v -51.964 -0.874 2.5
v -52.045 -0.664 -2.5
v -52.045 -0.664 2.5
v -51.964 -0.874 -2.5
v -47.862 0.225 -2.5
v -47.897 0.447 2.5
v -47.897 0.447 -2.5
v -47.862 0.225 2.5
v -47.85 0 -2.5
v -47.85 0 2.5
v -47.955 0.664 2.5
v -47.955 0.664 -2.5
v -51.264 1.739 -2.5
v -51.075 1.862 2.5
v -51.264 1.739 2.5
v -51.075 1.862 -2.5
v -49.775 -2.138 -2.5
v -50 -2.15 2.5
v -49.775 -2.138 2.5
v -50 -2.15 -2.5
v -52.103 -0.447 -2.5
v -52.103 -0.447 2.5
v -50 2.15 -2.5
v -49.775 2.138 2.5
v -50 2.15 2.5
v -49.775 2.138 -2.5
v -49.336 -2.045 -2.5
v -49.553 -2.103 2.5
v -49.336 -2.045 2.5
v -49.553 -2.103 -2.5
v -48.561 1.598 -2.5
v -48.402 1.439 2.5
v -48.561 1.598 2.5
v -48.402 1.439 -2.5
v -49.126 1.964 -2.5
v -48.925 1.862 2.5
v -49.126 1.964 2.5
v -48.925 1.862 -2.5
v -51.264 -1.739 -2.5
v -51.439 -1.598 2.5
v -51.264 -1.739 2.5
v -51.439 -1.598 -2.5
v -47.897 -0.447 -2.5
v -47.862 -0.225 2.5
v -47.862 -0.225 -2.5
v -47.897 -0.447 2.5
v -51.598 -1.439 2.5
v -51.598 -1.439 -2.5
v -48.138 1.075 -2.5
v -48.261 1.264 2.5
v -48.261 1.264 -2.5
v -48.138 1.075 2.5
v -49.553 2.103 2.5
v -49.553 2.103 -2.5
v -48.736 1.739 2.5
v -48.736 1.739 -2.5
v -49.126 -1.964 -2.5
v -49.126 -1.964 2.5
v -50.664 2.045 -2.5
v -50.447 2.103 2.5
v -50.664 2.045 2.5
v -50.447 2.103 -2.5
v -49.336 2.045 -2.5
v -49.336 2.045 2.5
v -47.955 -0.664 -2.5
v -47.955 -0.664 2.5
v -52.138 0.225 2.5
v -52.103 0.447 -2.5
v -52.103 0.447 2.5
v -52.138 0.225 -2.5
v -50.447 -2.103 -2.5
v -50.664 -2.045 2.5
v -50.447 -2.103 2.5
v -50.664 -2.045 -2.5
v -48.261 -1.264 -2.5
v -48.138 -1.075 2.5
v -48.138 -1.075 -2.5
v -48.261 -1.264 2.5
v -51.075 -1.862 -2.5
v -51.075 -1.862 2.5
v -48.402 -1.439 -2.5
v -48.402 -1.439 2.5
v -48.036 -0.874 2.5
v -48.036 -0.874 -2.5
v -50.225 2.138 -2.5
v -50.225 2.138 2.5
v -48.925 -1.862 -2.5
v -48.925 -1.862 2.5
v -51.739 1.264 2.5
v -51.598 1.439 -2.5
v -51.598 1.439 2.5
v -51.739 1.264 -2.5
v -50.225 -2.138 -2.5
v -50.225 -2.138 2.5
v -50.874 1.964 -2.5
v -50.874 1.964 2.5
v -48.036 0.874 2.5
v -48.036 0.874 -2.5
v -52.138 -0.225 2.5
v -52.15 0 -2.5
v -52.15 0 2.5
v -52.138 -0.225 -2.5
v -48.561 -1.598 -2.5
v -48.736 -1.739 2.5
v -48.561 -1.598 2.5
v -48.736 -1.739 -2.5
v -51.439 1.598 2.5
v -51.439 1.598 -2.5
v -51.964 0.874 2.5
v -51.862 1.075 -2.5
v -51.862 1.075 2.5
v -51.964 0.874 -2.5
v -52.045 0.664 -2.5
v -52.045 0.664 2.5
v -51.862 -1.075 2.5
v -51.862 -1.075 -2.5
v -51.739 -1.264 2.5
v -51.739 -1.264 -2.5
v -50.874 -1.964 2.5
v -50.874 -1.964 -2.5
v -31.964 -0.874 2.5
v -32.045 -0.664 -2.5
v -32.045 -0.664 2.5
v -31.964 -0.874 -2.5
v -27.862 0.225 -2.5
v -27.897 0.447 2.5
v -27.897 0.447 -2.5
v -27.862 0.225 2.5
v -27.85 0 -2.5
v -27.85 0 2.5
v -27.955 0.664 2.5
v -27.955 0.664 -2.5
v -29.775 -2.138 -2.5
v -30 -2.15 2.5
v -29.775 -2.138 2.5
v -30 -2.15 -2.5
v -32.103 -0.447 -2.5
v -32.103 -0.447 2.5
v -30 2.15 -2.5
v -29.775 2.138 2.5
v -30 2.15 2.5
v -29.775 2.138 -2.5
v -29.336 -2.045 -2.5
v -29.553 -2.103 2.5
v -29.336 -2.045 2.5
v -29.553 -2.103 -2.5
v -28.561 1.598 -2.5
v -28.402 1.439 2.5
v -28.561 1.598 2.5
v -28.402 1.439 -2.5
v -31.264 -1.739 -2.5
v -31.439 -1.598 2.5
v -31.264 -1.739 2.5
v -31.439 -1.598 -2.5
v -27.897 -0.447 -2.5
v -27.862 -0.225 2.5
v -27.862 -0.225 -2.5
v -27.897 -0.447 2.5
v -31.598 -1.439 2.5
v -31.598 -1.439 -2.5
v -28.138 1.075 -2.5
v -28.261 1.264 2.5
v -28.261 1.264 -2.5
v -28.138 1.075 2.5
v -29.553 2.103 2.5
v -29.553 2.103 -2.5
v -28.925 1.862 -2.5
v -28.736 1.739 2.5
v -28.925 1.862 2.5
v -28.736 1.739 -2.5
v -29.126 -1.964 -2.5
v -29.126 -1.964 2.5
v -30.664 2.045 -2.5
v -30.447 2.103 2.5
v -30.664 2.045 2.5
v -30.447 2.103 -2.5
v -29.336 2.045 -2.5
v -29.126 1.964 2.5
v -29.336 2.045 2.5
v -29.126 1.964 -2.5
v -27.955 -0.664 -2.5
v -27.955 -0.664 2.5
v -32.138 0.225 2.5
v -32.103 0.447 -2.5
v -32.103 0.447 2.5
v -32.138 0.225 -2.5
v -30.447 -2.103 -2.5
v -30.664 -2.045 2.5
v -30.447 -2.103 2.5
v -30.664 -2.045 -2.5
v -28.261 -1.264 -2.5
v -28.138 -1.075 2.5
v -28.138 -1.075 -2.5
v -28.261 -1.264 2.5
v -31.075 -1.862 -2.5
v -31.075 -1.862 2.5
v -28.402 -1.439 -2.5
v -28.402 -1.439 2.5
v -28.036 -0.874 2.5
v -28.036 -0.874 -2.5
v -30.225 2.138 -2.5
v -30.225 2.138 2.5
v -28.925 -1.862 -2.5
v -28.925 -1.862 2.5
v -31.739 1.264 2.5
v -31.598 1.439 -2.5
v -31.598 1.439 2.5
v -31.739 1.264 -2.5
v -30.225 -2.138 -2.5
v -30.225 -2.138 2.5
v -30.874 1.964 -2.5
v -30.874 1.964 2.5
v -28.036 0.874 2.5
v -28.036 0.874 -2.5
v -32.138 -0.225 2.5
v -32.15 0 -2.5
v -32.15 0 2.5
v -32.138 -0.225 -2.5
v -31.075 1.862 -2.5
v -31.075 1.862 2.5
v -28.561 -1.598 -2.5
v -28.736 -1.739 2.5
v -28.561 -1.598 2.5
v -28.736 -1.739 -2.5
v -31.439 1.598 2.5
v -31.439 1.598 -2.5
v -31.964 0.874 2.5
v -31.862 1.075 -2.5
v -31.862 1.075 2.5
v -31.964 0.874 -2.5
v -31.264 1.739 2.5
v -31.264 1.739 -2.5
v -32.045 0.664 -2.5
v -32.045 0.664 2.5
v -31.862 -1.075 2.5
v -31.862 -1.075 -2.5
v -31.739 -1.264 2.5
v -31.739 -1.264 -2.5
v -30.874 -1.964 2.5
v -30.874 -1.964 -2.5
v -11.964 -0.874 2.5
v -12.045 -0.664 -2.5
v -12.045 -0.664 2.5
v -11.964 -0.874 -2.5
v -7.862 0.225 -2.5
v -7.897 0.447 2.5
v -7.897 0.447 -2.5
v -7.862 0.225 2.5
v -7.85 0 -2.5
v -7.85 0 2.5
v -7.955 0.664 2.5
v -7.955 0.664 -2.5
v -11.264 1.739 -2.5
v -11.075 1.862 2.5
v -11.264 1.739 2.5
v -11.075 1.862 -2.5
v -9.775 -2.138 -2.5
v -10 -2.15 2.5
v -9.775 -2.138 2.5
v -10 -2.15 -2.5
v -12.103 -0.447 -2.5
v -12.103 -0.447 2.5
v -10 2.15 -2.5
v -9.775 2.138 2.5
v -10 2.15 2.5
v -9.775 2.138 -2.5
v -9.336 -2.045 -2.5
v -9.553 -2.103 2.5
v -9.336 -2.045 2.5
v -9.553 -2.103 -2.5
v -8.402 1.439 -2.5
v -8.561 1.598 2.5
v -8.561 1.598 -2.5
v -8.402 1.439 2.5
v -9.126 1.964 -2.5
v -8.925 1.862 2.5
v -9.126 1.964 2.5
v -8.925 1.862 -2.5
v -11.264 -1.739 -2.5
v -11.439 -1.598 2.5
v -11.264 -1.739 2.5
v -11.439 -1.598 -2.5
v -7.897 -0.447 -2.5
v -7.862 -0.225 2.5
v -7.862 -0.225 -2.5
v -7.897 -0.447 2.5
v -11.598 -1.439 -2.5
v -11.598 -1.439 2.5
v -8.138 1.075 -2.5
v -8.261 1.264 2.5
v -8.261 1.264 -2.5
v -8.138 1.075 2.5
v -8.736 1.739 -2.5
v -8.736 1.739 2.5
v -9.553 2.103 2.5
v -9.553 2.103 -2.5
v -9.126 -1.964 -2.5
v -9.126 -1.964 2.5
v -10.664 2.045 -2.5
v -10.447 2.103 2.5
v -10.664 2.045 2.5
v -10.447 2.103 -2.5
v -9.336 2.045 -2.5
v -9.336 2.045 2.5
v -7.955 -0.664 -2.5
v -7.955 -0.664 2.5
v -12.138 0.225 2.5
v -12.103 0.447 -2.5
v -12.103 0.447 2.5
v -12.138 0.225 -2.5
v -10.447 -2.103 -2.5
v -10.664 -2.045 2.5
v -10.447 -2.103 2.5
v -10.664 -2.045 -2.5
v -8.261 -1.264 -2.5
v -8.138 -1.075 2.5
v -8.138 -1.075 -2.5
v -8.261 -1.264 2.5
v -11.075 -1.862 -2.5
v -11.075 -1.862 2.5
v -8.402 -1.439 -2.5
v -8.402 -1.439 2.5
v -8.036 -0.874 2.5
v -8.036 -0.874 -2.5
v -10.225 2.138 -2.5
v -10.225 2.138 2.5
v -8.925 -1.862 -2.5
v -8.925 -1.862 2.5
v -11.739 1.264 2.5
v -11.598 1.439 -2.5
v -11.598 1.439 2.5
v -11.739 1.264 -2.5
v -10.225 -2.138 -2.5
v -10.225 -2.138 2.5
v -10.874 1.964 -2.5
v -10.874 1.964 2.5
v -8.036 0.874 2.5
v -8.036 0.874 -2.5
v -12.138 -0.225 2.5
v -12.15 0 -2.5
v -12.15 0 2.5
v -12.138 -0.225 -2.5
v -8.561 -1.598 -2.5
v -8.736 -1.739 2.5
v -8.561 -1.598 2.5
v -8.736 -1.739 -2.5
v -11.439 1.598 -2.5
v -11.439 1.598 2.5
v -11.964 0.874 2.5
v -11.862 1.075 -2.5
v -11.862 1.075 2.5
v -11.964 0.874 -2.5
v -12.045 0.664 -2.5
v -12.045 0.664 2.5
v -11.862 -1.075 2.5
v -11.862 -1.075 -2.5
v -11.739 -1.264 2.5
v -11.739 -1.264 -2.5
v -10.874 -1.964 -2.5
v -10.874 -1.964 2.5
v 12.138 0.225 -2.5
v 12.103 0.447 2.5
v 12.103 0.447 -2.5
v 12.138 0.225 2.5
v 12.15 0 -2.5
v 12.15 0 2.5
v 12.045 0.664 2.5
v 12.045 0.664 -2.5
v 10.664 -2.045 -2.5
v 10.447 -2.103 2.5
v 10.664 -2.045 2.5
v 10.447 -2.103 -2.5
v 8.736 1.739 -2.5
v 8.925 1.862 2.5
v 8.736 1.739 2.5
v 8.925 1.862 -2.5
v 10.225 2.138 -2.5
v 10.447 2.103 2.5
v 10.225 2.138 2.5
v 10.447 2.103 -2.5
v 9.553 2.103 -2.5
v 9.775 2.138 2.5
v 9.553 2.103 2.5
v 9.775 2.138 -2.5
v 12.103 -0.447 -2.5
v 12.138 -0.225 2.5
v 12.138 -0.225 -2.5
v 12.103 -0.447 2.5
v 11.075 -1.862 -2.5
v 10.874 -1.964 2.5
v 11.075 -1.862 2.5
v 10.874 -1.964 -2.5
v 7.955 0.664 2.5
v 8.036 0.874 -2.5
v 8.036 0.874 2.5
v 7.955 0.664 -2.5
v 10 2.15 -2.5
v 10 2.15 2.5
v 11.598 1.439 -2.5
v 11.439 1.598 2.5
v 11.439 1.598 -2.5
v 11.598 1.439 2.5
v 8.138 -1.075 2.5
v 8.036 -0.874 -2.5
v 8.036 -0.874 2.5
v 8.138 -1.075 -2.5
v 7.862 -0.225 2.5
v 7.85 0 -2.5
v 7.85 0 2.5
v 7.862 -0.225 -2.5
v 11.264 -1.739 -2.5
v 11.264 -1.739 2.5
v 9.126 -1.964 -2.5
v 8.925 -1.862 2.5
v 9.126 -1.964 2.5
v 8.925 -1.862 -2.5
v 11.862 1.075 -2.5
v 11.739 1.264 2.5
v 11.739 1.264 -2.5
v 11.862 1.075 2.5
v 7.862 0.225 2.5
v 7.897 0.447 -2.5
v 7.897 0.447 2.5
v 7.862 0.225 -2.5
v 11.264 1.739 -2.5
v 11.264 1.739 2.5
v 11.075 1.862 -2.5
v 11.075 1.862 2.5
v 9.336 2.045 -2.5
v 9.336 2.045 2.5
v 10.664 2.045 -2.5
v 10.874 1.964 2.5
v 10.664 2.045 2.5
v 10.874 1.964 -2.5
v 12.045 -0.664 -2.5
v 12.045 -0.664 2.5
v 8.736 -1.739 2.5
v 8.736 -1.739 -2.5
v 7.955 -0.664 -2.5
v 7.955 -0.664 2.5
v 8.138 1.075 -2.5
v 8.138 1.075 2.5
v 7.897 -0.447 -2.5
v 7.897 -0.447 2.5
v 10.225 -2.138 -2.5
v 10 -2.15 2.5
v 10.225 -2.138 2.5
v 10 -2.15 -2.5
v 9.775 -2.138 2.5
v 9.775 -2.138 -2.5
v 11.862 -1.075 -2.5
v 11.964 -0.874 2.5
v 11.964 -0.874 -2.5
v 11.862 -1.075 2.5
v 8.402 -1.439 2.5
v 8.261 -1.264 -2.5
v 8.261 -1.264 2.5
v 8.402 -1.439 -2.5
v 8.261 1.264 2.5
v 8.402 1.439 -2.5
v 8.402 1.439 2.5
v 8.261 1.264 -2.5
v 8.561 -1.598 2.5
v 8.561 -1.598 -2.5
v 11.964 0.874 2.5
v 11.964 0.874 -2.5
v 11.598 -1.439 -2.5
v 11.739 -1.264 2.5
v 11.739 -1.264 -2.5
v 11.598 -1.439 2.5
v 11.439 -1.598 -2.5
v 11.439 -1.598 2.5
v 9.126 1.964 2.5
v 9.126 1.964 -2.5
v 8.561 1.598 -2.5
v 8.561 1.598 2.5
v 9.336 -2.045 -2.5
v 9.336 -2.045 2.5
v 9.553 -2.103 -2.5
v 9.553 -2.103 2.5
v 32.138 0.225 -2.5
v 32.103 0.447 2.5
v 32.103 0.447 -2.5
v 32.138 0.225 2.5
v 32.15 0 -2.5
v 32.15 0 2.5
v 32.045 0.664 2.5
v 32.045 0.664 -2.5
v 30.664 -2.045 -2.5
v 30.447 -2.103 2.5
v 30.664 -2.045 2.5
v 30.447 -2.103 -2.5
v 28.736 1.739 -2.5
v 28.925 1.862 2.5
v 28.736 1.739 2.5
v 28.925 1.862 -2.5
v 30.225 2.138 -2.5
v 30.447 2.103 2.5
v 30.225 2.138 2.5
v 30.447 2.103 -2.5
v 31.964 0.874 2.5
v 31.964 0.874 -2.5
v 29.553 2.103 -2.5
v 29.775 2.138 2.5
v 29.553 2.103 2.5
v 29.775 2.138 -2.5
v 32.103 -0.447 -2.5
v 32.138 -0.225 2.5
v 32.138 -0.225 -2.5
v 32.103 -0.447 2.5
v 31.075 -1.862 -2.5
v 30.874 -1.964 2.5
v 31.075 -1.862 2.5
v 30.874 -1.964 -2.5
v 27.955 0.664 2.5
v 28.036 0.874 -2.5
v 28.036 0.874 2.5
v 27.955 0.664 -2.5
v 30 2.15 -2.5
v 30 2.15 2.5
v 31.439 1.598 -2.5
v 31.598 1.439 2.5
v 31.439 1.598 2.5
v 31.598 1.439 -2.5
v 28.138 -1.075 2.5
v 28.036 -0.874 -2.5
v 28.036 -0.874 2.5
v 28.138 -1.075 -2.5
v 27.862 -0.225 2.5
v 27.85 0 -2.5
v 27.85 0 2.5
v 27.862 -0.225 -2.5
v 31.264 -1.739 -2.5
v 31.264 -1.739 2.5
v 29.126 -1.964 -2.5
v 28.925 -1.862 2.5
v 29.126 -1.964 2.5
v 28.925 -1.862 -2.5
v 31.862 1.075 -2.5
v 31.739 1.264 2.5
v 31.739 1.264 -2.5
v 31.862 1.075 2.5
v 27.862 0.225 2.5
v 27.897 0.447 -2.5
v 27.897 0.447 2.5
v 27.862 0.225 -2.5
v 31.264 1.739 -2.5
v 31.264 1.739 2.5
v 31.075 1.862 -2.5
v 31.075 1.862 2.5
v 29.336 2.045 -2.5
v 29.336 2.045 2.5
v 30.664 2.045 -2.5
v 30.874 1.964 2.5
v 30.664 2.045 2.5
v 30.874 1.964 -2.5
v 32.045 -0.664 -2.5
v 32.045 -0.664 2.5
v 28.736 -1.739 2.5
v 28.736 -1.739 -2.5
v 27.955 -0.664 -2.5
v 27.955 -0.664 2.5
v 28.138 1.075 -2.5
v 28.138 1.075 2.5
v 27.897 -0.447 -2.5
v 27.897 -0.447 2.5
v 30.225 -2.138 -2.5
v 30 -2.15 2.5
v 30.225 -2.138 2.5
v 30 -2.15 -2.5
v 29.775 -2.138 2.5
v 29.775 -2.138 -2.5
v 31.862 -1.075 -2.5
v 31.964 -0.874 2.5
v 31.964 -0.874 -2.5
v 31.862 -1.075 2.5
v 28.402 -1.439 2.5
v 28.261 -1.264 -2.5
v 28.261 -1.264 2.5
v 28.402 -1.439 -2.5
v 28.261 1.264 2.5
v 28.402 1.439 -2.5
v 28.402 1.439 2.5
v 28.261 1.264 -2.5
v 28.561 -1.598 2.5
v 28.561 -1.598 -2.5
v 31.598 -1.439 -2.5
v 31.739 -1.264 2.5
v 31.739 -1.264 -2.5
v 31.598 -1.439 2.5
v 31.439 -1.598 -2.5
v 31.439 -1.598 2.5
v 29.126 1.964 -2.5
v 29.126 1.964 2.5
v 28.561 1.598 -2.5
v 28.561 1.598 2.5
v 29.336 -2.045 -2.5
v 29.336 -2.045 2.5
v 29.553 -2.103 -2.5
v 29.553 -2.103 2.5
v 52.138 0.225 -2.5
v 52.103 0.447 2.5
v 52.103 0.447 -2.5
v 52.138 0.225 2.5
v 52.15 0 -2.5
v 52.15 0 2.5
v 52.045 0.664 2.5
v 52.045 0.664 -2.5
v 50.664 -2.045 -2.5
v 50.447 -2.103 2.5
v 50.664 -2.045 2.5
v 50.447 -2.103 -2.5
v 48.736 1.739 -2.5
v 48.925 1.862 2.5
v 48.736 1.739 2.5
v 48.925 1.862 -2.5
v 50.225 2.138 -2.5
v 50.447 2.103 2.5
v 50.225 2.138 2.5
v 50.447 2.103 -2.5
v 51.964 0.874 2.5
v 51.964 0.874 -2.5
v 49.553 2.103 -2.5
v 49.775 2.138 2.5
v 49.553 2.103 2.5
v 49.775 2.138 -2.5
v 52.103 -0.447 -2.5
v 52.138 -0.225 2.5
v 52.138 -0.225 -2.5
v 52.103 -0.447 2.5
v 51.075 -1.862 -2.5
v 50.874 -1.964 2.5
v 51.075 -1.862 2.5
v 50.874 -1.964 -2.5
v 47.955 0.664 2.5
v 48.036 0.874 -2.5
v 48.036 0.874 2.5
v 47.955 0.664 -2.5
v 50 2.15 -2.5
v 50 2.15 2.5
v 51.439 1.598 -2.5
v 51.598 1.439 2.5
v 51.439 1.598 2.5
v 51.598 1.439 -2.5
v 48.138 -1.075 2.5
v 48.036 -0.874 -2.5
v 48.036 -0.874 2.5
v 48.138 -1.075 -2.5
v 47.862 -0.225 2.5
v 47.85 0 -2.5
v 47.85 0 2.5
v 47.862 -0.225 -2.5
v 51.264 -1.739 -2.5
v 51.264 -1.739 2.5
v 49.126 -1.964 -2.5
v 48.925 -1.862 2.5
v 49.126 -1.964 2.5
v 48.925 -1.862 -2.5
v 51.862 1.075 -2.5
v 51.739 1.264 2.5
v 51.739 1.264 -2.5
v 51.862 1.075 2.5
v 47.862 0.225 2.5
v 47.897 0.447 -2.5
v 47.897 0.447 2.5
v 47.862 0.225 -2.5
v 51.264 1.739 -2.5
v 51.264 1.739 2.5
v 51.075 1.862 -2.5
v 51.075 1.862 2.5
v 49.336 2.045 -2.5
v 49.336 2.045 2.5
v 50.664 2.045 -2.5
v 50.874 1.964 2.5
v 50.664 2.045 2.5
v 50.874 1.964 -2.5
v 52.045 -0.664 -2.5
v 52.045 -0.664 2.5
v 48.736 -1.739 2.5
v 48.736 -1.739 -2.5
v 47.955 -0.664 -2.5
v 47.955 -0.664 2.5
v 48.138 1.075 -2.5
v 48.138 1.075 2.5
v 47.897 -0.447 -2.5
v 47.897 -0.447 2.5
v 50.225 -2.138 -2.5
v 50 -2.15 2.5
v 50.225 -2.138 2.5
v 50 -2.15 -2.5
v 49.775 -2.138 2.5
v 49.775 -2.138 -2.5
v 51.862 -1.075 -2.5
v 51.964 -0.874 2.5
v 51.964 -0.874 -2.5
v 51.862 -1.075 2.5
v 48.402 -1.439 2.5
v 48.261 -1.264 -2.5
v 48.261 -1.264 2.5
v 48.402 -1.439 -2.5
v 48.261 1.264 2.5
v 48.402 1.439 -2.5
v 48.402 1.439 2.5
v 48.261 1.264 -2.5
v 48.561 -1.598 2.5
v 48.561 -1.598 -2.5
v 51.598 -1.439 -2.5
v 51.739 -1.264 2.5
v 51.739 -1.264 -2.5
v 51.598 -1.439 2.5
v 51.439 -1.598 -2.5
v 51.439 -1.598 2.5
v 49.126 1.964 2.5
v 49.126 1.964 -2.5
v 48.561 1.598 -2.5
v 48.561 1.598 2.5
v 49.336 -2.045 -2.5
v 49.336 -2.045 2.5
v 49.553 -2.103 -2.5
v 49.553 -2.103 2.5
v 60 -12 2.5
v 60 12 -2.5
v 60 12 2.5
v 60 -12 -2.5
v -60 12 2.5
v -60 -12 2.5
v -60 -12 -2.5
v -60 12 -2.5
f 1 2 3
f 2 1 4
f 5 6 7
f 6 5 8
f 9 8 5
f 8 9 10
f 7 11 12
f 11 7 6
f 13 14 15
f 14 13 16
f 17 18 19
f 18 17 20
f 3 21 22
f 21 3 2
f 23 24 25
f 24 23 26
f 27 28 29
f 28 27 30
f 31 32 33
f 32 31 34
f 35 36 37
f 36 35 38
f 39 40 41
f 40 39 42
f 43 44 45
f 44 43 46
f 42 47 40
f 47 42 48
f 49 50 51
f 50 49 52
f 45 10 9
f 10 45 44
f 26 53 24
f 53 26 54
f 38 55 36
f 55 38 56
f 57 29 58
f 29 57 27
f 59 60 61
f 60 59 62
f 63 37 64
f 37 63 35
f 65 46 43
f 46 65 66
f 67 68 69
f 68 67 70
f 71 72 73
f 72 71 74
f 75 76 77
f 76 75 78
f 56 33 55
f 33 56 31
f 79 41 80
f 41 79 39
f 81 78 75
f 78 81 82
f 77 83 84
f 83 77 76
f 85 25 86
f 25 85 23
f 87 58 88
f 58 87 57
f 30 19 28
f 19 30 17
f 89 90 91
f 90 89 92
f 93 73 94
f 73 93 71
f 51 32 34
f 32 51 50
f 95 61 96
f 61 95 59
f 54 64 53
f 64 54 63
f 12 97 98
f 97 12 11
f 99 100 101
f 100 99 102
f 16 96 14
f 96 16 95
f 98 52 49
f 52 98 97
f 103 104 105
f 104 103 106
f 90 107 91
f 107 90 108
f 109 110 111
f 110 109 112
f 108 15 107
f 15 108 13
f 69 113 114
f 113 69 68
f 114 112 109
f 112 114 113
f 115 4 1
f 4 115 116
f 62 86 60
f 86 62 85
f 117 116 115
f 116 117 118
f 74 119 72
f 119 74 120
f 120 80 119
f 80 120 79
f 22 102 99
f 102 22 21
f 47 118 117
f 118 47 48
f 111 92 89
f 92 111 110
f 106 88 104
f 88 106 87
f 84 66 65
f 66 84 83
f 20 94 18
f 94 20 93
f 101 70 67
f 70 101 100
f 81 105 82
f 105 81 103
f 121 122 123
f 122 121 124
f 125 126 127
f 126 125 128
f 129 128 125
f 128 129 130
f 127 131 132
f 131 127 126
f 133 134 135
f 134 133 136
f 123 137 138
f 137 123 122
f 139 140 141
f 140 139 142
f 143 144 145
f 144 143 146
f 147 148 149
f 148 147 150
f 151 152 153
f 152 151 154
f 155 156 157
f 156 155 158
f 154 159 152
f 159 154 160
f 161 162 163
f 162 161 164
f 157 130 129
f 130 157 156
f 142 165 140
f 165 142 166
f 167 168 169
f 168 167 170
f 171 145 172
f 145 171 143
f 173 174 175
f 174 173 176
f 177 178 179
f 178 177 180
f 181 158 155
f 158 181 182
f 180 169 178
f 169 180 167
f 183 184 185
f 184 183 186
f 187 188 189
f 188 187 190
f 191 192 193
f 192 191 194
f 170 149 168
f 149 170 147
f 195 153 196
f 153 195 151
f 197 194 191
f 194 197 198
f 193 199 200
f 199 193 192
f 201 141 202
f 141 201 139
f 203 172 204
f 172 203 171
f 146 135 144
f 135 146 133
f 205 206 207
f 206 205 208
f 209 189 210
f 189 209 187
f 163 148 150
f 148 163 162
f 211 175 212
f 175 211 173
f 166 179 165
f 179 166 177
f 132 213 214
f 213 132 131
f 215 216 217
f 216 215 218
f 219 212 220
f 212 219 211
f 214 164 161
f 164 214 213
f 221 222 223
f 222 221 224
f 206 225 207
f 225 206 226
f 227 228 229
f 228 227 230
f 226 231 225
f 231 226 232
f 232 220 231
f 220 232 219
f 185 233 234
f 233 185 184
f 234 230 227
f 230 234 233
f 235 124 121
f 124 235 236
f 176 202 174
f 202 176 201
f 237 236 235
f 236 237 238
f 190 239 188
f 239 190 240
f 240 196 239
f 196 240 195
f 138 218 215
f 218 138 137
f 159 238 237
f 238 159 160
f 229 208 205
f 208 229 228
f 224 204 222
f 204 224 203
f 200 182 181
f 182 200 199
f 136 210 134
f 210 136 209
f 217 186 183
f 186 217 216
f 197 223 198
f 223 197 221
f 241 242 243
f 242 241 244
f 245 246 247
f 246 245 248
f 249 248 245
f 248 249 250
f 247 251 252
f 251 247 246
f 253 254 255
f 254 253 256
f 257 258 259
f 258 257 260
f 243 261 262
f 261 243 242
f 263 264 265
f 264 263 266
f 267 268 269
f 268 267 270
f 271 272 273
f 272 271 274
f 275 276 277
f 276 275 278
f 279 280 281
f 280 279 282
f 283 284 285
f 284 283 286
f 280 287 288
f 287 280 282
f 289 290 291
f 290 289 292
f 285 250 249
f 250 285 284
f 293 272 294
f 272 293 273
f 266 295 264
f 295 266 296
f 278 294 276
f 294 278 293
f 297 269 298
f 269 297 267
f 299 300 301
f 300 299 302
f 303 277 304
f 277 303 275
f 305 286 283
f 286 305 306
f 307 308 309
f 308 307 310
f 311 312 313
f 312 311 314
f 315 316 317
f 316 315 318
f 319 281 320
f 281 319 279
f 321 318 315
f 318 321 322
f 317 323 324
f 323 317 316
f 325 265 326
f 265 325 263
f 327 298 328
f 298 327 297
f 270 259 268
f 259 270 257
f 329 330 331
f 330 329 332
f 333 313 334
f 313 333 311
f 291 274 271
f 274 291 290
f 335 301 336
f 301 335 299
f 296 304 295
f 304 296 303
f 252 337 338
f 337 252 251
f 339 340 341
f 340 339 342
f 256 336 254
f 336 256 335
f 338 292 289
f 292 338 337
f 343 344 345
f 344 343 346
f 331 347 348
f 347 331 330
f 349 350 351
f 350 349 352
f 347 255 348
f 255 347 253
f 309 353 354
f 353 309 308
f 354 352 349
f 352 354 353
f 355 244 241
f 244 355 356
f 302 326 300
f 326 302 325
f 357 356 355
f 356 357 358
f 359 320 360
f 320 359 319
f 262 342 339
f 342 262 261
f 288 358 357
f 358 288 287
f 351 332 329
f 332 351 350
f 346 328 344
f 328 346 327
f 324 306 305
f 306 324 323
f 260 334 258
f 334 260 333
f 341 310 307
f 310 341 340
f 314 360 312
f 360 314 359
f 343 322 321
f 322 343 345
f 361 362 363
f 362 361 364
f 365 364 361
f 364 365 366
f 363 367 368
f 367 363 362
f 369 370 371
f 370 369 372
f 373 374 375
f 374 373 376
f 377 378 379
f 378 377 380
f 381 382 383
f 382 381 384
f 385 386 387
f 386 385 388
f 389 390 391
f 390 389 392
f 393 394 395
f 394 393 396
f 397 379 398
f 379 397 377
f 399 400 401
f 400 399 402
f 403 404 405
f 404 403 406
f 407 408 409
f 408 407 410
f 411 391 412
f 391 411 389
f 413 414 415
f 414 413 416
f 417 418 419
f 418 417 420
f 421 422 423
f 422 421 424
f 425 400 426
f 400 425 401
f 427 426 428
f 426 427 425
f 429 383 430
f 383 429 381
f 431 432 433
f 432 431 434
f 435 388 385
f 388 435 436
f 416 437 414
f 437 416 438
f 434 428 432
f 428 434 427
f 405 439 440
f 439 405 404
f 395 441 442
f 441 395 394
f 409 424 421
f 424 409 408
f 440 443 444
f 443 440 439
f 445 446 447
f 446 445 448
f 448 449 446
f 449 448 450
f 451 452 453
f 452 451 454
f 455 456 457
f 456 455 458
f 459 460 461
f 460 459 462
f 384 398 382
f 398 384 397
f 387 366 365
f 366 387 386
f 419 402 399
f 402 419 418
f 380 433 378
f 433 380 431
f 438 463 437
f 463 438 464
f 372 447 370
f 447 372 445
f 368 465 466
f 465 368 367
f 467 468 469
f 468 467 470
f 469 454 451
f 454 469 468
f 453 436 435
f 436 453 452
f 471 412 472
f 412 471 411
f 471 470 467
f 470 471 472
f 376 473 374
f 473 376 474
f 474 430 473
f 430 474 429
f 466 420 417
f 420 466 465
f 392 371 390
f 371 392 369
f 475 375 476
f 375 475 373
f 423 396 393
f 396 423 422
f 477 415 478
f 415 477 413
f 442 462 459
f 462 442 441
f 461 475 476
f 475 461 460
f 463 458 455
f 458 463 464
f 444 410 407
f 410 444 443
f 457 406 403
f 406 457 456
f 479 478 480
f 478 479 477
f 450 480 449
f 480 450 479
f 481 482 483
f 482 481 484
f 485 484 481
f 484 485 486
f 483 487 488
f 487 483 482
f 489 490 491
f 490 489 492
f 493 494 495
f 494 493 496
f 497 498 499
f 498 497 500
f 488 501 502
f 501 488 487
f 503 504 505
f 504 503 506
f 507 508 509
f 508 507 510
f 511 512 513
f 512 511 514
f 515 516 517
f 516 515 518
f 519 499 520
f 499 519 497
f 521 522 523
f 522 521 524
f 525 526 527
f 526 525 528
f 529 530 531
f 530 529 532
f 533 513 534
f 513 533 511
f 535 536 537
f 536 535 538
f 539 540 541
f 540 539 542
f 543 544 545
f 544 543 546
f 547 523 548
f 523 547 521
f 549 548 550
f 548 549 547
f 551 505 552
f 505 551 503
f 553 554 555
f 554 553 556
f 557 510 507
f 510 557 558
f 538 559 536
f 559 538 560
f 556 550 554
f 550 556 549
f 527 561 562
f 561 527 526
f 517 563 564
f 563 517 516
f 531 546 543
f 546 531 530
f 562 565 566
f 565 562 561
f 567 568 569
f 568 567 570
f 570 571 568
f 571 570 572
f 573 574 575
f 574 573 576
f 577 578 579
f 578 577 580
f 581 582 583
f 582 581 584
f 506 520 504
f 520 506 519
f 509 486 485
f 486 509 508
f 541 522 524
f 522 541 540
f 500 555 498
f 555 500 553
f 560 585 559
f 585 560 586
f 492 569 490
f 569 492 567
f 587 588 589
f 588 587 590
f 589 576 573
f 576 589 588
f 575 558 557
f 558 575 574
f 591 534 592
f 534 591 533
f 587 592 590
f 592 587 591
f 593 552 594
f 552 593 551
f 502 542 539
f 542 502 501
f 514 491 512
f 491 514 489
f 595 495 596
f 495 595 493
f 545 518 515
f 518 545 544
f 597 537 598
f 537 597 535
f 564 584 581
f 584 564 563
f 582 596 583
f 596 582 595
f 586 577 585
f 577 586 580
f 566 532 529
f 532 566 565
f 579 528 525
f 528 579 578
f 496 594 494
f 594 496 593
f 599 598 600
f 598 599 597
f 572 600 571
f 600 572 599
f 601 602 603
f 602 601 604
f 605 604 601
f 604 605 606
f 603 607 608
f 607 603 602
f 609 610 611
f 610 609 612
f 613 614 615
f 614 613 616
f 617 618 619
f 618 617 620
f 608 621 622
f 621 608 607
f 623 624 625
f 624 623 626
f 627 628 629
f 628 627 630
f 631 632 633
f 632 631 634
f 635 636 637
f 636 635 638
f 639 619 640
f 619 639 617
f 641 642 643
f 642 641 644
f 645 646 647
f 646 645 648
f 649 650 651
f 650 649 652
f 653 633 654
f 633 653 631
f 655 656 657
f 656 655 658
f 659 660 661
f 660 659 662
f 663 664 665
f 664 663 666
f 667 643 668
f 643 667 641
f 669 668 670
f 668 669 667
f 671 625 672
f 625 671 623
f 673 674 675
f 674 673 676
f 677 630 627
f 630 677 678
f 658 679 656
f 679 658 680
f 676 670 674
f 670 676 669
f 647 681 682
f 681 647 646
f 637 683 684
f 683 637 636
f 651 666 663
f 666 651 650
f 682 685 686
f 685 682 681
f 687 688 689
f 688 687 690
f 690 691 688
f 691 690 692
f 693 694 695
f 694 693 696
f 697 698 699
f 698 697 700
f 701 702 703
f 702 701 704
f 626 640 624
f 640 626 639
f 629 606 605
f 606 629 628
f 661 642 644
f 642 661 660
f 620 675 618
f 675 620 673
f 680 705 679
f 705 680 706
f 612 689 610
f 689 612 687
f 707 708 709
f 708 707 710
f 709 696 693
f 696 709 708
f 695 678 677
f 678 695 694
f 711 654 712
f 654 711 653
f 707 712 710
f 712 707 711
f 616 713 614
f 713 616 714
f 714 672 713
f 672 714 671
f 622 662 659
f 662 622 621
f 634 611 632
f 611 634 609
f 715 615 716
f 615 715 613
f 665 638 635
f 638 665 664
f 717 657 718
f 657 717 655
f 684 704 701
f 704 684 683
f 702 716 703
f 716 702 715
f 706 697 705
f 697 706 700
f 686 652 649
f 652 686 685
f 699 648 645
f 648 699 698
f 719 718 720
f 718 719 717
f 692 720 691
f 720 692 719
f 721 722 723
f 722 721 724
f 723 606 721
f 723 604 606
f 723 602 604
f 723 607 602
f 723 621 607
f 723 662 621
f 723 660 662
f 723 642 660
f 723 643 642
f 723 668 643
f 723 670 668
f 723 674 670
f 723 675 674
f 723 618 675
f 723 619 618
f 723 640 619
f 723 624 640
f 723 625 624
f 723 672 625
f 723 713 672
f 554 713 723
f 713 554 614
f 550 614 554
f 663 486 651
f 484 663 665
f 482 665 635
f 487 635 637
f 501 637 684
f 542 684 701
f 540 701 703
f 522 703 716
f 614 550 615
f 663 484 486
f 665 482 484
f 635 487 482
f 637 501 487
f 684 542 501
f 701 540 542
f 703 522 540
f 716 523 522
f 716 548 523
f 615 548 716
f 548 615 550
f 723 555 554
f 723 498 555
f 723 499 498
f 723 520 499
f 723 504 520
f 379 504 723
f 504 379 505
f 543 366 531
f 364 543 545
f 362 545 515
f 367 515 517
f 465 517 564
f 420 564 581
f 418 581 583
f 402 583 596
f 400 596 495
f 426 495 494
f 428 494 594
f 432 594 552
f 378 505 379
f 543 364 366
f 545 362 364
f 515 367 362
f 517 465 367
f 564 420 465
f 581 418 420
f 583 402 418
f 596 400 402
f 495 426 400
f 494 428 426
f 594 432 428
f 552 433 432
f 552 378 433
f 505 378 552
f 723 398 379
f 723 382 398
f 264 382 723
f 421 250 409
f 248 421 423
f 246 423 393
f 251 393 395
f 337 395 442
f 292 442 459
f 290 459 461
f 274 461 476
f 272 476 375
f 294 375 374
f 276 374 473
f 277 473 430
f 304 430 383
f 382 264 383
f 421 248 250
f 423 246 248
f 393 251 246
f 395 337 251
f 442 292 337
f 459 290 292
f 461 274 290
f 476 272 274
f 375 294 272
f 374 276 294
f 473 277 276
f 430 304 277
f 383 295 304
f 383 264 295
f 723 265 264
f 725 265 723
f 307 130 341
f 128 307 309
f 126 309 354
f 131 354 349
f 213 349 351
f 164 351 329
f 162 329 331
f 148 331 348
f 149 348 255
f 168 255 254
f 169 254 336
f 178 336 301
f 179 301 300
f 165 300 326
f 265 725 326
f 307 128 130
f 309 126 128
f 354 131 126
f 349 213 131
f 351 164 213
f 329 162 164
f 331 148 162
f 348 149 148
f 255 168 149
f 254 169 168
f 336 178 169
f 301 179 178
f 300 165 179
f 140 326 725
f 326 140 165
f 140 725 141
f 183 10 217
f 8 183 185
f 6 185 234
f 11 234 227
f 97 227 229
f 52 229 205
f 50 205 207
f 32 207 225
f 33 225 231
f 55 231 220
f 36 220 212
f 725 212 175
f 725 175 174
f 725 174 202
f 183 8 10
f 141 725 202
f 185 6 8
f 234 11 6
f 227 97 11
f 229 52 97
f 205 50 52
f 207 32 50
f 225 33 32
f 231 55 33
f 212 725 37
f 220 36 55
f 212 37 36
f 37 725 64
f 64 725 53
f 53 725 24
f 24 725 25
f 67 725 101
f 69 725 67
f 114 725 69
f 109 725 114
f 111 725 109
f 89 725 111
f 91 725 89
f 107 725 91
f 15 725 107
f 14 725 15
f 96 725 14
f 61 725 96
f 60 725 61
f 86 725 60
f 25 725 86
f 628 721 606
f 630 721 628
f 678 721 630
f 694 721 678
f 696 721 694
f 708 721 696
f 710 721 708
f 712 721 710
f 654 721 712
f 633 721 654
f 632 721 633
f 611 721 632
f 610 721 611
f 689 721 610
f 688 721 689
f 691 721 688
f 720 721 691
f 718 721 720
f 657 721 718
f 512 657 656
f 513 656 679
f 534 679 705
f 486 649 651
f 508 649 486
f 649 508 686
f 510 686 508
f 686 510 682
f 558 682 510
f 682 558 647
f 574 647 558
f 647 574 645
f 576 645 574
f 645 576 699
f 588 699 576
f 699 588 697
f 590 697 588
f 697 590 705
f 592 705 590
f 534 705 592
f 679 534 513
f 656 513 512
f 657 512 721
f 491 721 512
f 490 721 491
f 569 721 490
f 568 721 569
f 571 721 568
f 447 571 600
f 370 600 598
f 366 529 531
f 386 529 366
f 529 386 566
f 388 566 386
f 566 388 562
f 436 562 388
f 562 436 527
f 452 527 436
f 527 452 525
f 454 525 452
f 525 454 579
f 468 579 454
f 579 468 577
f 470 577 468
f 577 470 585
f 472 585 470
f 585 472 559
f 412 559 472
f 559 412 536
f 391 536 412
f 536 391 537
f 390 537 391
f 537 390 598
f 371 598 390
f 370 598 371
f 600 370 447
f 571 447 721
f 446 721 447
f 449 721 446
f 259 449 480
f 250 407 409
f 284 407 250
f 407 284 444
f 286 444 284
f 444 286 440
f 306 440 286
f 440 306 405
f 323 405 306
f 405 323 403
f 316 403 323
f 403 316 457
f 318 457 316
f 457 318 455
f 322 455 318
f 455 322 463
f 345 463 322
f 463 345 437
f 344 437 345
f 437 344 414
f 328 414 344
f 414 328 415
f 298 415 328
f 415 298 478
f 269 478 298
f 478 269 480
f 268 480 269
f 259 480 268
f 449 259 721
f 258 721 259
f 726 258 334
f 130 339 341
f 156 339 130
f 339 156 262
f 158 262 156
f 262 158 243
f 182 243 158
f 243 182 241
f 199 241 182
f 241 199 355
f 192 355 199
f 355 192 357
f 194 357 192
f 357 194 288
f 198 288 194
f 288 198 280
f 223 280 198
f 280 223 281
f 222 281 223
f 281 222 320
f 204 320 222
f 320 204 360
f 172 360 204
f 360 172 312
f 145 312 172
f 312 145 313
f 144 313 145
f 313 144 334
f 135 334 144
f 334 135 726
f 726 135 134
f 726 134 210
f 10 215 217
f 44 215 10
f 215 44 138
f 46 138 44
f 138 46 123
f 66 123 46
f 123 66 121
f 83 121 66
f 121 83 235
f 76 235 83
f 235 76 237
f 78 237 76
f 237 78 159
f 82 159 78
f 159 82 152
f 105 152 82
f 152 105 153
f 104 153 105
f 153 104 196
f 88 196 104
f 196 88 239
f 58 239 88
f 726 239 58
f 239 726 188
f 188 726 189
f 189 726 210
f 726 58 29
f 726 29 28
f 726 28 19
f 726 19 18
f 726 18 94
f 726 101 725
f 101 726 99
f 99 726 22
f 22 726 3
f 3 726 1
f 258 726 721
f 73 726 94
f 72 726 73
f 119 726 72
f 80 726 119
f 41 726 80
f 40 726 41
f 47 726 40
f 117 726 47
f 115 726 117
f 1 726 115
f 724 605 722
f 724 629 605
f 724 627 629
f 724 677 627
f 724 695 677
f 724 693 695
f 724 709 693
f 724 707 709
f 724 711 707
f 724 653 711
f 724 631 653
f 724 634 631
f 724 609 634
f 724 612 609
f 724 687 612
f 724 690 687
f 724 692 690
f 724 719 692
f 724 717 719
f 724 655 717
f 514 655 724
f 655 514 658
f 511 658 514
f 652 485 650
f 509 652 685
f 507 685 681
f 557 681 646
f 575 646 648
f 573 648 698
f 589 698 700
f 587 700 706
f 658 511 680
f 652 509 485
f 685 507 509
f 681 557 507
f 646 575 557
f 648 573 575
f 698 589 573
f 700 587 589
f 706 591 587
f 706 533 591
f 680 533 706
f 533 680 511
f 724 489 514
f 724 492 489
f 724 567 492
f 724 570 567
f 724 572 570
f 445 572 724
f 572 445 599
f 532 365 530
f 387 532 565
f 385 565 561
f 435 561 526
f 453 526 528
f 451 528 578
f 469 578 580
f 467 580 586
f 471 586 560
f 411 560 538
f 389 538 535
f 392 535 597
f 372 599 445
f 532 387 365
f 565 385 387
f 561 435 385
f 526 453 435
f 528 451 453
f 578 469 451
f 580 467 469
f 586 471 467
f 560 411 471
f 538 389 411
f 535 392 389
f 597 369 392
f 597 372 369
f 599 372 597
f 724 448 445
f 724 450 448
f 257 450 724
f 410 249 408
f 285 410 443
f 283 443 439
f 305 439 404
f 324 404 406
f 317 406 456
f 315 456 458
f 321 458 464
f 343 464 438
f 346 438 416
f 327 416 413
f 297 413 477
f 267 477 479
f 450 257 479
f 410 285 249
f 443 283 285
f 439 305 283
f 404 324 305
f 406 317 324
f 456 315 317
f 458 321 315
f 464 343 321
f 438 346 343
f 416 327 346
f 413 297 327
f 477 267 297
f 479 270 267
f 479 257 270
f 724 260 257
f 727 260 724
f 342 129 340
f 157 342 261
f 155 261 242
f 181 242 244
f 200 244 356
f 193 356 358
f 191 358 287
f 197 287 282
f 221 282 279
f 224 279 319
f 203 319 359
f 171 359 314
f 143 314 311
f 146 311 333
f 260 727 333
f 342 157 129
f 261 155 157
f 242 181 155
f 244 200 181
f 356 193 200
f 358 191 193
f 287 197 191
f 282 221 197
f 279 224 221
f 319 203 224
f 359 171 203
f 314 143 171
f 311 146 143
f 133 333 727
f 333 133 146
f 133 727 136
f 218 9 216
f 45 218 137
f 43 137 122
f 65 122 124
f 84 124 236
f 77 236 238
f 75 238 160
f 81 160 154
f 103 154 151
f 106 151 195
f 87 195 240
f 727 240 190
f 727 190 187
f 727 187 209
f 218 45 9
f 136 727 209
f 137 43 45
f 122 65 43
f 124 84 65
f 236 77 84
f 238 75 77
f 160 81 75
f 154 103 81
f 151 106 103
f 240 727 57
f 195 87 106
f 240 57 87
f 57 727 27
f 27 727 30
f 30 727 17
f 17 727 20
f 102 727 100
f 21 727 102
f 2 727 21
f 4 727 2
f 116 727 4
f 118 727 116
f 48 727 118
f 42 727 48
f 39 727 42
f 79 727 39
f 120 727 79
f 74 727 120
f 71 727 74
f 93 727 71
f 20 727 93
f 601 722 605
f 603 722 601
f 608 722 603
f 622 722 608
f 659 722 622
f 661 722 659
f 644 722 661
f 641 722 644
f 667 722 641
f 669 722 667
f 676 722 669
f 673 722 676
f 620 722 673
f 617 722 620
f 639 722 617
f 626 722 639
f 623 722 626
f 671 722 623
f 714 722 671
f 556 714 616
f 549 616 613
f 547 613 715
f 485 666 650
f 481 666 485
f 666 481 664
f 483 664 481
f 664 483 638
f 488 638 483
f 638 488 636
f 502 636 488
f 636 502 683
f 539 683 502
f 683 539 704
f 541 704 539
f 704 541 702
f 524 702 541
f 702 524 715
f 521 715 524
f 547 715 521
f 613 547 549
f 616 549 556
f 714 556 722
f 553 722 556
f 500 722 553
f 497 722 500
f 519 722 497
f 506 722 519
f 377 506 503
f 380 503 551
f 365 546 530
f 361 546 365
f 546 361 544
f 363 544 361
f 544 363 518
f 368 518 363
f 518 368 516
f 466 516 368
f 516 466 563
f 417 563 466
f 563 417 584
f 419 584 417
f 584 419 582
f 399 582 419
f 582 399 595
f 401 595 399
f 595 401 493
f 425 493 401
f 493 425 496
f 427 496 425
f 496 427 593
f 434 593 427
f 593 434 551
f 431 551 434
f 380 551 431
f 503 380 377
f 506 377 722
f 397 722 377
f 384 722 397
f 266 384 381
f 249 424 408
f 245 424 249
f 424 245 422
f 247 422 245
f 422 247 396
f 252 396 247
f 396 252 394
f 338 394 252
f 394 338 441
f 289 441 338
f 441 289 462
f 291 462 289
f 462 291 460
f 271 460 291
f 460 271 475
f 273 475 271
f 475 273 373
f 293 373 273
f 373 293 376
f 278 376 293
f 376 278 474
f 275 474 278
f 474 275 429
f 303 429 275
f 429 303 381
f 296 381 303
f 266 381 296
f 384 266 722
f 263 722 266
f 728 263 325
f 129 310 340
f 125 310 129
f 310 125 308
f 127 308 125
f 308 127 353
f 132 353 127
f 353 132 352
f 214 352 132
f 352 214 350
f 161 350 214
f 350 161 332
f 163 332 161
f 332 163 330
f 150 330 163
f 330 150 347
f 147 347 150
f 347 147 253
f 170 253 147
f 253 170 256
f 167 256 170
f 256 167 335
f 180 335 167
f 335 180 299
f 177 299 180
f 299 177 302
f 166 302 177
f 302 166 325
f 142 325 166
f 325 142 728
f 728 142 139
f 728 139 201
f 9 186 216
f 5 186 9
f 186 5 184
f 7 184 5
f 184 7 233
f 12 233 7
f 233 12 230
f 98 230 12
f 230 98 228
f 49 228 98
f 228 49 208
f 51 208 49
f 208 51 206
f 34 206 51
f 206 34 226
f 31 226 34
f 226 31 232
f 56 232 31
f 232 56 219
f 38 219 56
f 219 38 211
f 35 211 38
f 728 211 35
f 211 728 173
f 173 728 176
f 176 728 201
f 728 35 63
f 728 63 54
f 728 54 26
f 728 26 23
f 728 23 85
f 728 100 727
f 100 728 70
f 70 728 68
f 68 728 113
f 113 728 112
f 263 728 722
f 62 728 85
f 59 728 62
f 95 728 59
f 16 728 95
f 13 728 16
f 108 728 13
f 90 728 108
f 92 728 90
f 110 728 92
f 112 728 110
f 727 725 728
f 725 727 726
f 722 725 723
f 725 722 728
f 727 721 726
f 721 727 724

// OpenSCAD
// Linear rail spacer strip.
$fn = 60;
eps = 0.02;
length = 120;
width = 24;
thickness = 5;
hole_pitch = 20;
difference() {
    cube([length,width,thickness],center=true);
    for (x=[-length/2+10:hole_pitch:length/2-10]) translate([x,0,-thickness/2-eps]) cylinder(d=4.3,h=thickness+2*eps);
}
